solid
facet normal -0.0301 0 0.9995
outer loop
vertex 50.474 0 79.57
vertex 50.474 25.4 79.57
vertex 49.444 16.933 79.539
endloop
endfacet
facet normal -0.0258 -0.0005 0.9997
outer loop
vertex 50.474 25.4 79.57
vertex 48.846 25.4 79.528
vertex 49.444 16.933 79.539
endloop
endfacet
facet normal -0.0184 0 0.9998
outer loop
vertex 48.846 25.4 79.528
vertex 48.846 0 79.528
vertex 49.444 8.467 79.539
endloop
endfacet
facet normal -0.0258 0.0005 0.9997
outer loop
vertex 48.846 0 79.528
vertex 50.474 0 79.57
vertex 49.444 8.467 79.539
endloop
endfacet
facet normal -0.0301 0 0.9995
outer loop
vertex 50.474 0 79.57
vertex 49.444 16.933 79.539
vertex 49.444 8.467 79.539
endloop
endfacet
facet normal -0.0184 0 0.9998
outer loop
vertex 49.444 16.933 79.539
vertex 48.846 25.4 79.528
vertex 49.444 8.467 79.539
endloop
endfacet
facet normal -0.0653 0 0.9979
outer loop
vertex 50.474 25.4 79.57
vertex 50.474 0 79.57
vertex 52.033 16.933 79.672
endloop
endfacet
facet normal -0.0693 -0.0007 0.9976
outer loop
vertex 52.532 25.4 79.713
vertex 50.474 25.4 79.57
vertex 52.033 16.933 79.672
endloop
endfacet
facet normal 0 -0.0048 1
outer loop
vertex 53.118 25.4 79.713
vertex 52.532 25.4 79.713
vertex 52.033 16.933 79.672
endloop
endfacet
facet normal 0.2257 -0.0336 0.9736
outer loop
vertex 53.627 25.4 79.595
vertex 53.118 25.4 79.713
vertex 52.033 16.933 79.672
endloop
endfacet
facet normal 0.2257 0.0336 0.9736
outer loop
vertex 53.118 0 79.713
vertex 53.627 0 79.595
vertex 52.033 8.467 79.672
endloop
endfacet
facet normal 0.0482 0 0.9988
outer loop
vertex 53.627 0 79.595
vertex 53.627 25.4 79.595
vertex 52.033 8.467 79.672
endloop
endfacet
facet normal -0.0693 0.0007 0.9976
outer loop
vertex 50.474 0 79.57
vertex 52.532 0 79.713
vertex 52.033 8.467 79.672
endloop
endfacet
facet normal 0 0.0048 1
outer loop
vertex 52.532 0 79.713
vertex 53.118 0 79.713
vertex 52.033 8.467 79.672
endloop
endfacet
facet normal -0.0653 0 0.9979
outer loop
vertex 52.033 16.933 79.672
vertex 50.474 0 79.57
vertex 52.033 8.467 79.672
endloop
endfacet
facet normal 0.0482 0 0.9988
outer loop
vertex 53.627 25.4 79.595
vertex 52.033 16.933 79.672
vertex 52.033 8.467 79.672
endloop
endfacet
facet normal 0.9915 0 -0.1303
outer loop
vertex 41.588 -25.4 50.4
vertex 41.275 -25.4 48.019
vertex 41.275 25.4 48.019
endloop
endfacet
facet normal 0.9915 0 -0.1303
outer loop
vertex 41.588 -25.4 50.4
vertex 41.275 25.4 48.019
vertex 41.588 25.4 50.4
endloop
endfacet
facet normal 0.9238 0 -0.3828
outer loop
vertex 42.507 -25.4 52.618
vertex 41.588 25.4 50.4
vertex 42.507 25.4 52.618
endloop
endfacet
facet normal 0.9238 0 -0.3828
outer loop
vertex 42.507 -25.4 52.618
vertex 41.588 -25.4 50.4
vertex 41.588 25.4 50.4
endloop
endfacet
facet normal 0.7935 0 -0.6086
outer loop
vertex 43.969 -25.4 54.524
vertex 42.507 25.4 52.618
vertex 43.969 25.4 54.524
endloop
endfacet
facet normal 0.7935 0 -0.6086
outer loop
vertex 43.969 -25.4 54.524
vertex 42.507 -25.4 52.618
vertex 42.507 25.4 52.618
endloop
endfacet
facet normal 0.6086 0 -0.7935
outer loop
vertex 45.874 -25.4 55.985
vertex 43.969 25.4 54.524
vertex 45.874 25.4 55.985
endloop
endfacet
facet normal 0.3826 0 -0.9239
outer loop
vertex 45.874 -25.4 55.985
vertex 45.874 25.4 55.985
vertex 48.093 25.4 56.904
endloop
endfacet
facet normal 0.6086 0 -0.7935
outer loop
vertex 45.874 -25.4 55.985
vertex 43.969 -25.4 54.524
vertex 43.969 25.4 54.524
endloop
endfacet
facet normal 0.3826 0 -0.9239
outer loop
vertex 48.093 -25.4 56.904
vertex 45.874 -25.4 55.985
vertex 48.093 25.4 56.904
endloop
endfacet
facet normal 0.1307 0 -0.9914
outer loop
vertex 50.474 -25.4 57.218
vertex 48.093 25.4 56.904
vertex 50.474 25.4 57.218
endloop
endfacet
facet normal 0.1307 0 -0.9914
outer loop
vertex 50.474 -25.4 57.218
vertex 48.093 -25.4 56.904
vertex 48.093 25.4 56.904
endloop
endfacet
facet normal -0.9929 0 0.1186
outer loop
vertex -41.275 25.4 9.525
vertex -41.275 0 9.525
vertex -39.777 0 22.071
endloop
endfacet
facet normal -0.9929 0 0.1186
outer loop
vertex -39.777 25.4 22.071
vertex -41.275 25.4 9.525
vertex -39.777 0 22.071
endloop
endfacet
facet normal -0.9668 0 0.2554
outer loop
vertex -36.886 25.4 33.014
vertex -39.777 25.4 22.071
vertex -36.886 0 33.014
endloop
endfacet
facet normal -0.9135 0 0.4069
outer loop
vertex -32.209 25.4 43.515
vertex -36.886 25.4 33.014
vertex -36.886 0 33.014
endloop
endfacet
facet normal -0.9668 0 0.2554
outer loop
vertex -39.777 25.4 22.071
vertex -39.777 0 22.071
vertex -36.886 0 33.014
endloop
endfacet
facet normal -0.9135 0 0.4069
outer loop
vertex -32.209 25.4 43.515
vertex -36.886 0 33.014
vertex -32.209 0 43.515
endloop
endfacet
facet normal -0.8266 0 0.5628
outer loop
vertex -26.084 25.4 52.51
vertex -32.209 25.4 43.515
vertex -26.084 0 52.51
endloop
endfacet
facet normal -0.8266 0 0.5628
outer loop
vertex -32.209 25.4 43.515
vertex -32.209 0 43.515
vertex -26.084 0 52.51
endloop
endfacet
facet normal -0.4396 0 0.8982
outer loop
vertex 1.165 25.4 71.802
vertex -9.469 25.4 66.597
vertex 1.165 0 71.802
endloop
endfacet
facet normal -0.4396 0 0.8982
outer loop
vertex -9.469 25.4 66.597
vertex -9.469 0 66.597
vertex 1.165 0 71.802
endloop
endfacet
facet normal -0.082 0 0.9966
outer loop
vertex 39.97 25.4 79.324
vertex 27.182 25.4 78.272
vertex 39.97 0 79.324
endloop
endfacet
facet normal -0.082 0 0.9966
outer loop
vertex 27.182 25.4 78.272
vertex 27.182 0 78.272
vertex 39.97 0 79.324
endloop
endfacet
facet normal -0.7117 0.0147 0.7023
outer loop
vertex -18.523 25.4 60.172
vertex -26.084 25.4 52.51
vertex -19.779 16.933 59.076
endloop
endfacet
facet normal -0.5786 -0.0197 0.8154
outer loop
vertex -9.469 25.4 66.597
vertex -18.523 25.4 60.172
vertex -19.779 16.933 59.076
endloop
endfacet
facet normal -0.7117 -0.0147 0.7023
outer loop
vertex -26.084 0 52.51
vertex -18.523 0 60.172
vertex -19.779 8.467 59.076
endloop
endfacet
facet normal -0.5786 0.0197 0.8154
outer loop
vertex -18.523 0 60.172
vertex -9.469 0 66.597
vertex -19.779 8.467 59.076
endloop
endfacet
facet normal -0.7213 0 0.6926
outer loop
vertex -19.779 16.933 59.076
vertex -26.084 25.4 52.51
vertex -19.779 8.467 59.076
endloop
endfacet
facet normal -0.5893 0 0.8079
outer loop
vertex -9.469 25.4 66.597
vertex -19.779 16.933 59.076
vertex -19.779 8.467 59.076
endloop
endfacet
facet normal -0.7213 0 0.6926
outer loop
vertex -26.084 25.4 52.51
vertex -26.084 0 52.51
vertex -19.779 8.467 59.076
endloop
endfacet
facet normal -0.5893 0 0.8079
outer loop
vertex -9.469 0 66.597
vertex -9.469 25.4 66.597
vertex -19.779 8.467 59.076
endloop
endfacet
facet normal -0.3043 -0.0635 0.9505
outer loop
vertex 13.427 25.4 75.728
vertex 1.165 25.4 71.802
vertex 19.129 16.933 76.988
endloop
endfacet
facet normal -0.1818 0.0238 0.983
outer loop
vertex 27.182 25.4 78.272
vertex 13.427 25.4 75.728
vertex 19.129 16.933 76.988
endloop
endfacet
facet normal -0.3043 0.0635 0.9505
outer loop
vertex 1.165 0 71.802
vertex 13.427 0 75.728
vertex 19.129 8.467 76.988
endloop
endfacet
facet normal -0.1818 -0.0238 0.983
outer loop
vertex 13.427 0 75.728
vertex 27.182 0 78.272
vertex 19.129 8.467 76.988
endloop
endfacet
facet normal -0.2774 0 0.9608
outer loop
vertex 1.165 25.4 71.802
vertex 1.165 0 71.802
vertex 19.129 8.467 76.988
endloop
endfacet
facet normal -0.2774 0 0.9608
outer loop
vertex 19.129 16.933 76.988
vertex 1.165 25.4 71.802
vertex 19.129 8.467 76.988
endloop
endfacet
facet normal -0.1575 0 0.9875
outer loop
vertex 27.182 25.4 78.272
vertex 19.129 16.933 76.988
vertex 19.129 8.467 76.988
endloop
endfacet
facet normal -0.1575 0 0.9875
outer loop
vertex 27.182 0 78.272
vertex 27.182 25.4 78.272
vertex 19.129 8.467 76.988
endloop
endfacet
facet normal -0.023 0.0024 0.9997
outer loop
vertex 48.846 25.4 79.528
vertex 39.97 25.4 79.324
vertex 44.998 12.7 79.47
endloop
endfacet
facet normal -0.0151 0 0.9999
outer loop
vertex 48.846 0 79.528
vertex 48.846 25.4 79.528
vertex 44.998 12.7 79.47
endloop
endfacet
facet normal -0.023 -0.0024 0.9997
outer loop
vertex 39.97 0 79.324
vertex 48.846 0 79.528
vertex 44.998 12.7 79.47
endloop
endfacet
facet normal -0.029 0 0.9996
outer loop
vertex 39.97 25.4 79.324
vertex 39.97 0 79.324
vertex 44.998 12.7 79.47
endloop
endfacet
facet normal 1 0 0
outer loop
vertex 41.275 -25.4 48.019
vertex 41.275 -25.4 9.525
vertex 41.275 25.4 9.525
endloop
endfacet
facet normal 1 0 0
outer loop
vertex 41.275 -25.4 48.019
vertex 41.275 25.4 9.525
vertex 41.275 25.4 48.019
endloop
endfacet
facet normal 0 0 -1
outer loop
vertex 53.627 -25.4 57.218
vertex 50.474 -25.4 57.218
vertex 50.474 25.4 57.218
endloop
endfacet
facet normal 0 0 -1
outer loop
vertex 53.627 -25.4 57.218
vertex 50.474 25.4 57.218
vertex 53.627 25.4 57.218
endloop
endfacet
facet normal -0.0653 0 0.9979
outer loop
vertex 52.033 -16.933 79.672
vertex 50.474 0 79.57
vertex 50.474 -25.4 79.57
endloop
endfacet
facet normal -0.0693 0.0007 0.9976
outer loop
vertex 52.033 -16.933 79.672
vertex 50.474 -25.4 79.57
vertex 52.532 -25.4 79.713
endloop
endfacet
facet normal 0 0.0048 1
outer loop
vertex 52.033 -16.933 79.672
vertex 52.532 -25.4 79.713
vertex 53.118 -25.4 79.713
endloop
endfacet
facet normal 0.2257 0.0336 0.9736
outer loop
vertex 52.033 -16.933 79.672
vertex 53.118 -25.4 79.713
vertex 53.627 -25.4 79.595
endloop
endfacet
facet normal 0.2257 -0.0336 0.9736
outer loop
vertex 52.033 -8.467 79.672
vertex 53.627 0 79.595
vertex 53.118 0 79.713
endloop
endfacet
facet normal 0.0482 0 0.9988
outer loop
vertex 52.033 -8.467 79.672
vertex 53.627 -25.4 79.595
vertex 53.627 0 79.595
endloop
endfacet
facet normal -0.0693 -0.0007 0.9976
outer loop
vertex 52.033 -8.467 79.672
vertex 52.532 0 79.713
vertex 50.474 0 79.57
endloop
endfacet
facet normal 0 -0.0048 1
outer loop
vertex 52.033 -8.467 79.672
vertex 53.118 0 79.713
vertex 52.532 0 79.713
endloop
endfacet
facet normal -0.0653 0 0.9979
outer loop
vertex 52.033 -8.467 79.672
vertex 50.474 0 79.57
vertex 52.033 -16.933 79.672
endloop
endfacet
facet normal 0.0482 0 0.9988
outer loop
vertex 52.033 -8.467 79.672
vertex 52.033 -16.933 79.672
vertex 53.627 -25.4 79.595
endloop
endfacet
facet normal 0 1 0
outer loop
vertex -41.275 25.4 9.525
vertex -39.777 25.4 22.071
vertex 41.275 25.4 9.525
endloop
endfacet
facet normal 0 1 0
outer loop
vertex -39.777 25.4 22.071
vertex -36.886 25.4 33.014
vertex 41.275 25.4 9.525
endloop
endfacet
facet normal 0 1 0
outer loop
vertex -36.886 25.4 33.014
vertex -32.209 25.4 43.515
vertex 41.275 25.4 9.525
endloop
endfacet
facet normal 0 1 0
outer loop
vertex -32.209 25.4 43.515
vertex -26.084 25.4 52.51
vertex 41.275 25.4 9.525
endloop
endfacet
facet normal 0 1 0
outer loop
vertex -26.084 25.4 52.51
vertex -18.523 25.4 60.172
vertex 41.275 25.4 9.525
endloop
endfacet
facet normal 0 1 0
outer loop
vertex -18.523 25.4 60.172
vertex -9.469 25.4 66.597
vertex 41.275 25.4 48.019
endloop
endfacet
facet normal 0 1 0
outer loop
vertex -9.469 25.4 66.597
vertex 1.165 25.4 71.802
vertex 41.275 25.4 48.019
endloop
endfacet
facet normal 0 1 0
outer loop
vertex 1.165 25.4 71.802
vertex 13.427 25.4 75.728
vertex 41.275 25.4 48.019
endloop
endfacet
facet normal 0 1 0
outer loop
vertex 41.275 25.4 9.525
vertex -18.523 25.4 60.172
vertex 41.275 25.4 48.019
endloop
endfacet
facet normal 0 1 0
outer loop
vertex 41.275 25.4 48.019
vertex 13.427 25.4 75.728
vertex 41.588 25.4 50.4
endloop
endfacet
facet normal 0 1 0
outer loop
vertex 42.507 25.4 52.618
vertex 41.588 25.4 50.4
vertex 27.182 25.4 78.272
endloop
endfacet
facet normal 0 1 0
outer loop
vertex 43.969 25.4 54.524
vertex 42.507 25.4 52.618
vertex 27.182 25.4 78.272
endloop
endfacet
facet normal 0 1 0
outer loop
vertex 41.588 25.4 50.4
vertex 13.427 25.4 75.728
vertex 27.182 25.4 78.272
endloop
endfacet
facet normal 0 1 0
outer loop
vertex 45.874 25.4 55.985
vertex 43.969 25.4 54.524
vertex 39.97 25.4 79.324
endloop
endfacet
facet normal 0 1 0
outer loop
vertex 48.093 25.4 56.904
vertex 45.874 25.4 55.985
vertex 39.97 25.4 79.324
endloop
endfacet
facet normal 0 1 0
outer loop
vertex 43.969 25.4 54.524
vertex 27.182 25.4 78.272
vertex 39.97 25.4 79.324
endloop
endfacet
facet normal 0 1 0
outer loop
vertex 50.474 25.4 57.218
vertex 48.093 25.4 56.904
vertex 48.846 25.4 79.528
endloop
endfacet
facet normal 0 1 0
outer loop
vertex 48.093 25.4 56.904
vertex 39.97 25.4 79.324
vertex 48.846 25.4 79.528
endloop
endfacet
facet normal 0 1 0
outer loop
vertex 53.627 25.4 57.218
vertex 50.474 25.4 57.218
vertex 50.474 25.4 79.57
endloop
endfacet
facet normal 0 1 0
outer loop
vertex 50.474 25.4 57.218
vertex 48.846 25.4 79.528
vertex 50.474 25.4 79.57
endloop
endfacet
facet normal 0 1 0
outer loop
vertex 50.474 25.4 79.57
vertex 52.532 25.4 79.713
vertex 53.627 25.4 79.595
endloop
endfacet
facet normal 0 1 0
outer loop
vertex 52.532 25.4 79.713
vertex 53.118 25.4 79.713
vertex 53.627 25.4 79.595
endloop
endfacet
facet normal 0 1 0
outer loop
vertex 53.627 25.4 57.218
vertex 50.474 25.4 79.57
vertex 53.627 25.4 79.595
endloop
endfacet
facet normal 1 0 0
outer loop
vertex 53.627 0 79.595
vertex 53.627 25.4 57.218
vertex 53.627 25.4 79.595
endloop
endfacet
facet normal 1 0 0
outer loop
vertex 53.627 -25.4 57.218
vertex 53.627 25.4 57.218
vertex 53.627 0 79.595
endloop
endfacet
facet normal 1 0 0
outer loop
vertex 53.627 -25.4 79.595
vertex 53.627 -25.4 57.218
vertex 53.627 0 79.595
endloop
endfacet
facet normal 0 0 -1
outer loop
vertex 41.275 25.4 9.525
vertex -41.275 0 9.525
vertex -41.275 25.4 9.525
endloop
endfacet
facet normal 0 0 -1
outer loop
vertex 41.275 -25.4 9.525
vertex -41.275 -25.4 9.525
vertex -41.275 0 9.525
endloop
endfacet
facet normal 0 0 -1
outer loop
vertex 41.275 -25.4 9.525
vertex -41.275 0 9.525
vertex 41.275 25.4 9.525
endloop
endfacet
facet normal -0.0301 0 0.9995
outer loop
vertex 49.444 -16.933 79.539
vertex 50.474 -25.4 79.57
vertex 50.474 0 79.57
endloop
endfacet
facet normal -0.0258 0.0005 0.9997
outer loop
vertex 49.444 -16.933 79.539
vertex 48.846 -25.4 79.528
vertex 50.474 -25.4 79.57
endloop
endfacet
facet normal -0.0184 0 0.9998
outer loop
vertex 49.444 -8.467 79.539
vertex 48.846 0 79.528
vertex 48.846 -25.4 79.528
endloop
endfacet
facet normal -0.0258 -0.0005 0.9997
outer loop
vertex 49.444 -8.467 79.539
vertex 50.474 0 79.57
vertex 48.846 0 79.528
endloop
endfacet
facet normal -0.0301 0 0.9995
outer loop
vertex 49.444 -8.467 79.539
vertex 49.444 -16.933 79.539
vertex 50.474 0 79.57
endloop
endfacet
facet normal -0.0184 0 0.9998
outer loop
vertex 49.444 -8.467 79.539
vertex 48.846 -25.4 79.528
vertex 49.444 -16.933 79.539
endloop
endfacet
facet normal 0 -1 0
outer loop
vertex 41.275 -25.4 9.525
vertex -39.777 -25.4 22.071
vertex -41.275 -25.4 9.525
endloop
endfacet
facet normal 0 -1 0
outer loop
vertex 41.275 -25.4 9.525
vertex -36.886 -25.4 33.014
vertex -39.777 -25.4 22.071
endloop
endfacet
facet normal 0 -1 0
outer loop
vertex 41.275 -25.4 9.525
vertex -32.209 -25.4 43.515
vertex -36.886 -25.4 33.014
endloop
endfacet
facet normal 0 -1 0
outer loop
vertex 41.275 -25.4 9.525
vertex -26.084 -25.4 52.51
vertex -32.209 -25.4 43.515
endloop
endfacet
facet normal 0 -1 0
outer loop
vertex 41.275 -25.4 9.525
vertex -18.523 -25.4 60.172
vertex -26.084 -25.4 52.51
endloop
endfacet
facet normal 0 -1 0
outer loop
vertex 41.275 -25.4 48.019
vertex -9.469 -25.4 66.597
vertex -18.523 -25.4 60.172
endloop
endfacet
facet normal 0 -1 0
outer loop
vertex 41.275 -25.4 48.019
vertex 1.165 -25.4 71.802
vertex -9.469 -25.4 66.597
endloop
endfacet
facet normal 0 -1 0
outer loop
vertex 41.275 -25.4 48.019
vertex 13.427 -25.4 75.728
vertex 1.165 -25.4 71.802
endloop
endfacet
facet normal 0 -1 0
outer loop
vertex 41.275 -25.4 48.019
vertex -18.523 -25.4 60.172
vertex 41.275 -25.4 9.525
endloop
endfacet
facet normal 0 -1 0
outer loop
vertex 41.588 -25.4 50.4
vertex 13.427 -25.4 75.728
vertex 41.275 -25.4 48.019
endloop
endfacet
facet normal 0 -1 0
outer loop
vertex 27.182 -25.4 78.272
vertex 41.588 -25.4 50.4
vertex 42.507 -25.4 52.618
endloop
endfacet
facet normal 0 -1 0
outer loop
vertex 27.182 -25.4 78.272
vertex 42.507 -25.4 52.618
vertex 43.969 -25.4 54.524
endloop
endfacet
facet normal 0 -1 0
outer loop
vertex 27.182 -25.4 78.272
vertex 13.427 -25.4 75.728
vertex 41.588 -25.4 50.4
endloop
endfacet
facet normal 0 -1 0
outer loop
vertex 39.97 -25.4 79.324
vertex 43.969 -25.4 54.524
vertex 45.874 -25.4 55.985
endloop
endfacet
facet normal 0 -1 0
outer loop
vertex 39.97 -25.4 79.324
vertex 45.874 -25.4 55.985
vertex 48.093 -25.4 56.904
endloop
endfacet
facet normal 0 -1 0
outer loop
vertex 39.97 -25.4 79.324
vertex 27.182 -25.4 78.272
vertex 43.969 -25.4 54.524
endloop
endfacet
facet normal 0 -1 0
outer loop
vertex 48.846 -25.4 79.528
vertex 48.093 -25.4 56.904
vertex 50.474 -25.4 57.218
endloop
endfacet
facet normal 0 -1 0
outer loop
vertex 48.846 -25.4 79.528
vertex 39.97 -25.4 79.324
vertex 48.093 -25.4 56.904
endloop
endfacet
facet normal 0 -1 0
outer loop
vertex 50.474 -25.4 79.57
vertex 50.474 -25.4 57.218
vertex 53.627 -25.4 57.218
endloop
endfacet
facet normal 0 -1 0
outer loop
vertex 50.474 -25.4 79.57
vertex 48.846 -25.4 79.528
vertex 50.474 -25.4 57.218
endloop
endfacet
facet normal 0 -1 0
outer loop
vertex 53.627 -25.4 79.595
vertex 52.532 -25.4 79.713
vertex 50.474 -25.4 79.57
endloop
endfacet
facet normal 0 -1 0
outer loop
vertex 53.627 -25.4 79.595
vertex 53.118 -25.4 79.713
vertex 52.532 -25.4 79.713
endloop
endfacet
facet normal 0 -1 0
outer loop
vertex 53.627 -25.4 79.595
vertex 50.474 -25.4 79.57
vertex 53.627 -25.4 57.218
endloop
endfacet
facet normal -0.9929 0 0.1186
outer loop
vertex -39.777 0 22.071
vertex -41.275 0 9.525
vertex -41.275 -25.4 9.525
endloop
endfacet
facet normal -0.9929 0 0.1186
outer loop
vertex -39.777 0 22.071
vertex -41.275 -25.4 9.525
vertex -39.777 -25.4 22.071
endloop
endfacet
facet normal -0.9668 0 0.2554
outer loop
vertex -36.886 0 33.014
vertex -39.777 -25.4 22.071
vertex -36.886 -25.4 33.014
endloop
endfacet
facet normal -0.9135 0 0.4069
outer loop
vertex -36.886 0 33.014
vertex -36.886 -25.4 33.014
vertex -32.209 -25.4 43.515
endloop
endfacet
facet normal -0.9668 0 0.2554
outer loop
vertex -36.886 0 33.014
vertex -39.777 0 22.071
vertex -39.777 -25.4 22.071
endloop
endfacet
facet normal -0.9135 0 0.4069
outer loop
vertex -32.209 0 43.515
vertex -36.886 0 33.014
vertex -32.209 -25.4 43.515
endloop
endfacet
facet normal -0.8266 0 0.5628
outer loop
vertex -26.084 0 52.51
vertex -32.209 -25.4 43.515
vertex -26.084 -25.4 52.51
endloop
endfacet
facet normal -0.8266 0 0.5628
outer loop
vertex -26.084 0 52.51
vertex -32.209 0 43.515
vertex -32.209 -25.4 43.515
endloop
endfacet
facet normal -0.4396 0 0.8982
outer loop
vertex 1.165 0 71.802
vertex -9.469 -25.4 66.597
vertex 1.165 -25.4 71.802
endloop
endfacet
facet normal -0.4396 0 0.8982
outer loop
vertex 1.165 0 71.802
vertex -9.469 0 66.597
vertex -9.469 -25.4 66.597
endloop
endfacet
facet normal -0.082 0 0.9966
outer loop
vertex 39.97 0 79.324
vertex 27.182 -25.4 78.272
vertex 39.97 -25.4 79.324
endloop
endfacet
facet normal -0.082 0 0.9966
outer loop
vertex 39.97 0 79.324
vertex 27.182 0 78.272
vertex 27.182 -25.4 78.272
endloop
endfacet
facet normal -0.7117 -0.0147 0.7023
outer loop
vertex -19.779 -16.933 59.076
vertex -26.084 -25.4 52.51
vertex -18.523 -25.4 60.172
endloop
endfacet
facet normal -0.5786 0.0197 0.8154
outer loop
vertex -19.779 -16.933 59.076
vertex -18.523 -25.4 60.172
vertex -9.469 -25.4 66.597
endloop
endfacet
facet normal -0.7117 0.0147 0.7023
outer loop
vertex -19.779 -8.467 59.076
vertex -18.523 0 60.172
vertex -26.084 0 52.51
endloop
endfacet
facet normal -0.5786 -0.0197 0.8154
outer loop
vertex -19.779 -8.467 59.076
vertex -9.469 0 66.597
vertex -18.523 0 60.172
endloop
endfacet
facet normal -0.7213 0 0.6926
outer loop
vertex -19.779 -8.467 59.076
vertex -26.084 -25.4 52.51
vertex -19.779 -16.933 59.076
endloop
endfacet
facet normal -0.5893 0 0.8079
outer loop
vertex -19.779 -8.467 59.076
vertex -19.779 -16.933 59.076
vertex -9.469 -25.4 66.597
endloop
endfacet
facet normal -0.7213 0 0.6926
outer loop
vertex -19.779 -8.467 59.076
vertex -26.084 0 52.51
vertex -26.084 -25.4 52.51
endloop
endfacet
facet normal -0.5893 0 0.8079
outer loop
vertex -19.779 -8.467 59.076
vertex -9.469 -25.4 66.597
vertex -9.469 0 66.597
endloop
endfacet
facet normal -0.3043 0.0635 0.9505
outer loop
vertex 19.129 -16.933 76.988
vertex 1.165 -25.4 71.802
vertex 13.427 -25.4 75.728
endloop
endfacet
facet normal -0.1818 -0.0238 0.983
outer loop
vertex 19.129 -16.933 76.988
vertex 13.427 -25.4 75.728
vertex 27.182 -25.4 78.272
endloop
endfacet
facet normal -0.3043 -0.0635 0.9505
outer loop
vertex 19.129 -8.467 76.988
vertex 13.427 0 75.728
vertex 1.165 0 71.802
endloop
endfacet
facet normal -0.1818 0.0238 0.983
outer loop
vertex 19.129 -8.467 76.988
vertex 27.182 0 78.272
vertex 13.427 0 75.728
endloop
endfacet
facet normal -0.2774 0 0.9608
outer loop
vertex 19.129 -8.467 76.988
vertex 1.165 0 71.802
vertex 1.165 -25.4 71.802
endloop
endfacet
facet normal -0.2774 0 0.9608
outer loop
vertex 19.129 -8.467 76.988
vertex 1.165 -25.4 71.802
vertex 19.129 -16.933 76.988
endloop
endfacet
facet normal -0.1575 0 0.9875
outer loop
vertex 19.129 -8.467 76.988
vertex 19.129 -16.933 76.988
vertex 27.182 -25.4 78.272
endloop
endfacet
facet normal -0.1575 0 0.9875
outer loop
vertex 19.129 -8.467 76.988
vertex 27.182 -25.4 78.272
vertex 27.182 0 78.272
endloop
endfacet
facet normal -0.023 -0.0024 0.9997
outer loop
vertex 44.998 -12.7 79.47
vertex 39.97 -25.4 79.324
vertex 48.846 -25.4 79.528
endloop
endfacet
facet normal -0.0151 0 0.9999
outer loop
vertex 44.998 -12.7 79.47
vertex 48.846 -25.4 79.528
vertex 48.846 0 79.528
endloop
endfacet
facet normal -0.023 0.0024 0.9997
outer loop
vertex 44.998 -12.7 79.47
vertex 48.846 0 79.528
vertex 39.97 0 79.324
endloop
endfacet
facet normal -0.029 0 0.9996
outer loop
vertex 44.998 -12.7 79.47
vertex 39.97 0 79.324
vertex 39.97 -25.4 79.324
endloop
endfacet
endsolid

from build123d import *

# Parameters (mm, degrees)
F1_DEPTH = 25.4


with BuildPart() as f1:
    # F0 (on Front) → F1 (new body, symmetric)
    with BuildSketch(Plane.XZ):
        with BuildLine():
            Line((-41.275, 9.525), (18.9229995012, 9.525))
            Line((18.9229995012, 9.525), (18.9229995012, 48.0189798517))
            ThreePointArc((18.9229995012, 48.0189798517), (27.5958880394, 69.7458014014), (48.8464394104, 79.5278173835))
            add(Edge.make_bspline(
                [(-41.275, 9.525), (-37.3546025083, 80.3186400557), (32.5938258146, 79.2506709796), (48.8464394104, 79.5278173835)],
                knots=[0, 0, 0, 0, 0.8264340186, 0.8264340186, 0.8264340186, 0.8264340186], degree=3))
        make_face()
        with BuildLine():
            Line((18.9229995012, 9.525), (41.275, 9.525))
            Line((41.275, 9.525), (41.275, 48.0189798517))
            ThreePointArc((41.275, 48.0189798517), (43.9692765801, 54.5235389122), (50.4738356406, 57.2178154923))
            Line((50.4738356406, 57.2178154923), (53.6273793955, 57.2178154923))
            Line((53.6273793955, 57.2178154923), (53.6273793955, 79.5951649401))
            add(Edge.make_bspline(
                [(50.4738356406, 79.5698159911), (52.5255819675, 79.6536185215), (52.860162183, 79.8598219744), (53.6273793955, 79.5951649401)],
                knots=[0.8581554272, 0.8581554272, 0.8581554272, 0.8581554272, 1, 1, 1, 1], degree=3))
            add(Edge.make_bspline(
                [(48.8464394104, 79.5278173835), (49.4702711805, 79.5384552253), (50.0149933862, 79.5510748137), (50.4738356406, 79.5698159911)],
                knots=[0.8264340186, 0.8264340186, 0.8264340186, 0.8264340186, 0.8581554272, 0.8581554272, 0.8581554272, 0.8581554272], degree=3))
            ThreePointArc((48.8464394104, 79.5278173835), (27.5958880394, 69.7458014014), (18.9229995012, 48.0189798517))
            Line((18.9229995012, 48.0189798517), (18.9229995012, 9.525))
        make_face()
    extrude(amount=F1_DEPTH, both=True)


solid = f1.part
